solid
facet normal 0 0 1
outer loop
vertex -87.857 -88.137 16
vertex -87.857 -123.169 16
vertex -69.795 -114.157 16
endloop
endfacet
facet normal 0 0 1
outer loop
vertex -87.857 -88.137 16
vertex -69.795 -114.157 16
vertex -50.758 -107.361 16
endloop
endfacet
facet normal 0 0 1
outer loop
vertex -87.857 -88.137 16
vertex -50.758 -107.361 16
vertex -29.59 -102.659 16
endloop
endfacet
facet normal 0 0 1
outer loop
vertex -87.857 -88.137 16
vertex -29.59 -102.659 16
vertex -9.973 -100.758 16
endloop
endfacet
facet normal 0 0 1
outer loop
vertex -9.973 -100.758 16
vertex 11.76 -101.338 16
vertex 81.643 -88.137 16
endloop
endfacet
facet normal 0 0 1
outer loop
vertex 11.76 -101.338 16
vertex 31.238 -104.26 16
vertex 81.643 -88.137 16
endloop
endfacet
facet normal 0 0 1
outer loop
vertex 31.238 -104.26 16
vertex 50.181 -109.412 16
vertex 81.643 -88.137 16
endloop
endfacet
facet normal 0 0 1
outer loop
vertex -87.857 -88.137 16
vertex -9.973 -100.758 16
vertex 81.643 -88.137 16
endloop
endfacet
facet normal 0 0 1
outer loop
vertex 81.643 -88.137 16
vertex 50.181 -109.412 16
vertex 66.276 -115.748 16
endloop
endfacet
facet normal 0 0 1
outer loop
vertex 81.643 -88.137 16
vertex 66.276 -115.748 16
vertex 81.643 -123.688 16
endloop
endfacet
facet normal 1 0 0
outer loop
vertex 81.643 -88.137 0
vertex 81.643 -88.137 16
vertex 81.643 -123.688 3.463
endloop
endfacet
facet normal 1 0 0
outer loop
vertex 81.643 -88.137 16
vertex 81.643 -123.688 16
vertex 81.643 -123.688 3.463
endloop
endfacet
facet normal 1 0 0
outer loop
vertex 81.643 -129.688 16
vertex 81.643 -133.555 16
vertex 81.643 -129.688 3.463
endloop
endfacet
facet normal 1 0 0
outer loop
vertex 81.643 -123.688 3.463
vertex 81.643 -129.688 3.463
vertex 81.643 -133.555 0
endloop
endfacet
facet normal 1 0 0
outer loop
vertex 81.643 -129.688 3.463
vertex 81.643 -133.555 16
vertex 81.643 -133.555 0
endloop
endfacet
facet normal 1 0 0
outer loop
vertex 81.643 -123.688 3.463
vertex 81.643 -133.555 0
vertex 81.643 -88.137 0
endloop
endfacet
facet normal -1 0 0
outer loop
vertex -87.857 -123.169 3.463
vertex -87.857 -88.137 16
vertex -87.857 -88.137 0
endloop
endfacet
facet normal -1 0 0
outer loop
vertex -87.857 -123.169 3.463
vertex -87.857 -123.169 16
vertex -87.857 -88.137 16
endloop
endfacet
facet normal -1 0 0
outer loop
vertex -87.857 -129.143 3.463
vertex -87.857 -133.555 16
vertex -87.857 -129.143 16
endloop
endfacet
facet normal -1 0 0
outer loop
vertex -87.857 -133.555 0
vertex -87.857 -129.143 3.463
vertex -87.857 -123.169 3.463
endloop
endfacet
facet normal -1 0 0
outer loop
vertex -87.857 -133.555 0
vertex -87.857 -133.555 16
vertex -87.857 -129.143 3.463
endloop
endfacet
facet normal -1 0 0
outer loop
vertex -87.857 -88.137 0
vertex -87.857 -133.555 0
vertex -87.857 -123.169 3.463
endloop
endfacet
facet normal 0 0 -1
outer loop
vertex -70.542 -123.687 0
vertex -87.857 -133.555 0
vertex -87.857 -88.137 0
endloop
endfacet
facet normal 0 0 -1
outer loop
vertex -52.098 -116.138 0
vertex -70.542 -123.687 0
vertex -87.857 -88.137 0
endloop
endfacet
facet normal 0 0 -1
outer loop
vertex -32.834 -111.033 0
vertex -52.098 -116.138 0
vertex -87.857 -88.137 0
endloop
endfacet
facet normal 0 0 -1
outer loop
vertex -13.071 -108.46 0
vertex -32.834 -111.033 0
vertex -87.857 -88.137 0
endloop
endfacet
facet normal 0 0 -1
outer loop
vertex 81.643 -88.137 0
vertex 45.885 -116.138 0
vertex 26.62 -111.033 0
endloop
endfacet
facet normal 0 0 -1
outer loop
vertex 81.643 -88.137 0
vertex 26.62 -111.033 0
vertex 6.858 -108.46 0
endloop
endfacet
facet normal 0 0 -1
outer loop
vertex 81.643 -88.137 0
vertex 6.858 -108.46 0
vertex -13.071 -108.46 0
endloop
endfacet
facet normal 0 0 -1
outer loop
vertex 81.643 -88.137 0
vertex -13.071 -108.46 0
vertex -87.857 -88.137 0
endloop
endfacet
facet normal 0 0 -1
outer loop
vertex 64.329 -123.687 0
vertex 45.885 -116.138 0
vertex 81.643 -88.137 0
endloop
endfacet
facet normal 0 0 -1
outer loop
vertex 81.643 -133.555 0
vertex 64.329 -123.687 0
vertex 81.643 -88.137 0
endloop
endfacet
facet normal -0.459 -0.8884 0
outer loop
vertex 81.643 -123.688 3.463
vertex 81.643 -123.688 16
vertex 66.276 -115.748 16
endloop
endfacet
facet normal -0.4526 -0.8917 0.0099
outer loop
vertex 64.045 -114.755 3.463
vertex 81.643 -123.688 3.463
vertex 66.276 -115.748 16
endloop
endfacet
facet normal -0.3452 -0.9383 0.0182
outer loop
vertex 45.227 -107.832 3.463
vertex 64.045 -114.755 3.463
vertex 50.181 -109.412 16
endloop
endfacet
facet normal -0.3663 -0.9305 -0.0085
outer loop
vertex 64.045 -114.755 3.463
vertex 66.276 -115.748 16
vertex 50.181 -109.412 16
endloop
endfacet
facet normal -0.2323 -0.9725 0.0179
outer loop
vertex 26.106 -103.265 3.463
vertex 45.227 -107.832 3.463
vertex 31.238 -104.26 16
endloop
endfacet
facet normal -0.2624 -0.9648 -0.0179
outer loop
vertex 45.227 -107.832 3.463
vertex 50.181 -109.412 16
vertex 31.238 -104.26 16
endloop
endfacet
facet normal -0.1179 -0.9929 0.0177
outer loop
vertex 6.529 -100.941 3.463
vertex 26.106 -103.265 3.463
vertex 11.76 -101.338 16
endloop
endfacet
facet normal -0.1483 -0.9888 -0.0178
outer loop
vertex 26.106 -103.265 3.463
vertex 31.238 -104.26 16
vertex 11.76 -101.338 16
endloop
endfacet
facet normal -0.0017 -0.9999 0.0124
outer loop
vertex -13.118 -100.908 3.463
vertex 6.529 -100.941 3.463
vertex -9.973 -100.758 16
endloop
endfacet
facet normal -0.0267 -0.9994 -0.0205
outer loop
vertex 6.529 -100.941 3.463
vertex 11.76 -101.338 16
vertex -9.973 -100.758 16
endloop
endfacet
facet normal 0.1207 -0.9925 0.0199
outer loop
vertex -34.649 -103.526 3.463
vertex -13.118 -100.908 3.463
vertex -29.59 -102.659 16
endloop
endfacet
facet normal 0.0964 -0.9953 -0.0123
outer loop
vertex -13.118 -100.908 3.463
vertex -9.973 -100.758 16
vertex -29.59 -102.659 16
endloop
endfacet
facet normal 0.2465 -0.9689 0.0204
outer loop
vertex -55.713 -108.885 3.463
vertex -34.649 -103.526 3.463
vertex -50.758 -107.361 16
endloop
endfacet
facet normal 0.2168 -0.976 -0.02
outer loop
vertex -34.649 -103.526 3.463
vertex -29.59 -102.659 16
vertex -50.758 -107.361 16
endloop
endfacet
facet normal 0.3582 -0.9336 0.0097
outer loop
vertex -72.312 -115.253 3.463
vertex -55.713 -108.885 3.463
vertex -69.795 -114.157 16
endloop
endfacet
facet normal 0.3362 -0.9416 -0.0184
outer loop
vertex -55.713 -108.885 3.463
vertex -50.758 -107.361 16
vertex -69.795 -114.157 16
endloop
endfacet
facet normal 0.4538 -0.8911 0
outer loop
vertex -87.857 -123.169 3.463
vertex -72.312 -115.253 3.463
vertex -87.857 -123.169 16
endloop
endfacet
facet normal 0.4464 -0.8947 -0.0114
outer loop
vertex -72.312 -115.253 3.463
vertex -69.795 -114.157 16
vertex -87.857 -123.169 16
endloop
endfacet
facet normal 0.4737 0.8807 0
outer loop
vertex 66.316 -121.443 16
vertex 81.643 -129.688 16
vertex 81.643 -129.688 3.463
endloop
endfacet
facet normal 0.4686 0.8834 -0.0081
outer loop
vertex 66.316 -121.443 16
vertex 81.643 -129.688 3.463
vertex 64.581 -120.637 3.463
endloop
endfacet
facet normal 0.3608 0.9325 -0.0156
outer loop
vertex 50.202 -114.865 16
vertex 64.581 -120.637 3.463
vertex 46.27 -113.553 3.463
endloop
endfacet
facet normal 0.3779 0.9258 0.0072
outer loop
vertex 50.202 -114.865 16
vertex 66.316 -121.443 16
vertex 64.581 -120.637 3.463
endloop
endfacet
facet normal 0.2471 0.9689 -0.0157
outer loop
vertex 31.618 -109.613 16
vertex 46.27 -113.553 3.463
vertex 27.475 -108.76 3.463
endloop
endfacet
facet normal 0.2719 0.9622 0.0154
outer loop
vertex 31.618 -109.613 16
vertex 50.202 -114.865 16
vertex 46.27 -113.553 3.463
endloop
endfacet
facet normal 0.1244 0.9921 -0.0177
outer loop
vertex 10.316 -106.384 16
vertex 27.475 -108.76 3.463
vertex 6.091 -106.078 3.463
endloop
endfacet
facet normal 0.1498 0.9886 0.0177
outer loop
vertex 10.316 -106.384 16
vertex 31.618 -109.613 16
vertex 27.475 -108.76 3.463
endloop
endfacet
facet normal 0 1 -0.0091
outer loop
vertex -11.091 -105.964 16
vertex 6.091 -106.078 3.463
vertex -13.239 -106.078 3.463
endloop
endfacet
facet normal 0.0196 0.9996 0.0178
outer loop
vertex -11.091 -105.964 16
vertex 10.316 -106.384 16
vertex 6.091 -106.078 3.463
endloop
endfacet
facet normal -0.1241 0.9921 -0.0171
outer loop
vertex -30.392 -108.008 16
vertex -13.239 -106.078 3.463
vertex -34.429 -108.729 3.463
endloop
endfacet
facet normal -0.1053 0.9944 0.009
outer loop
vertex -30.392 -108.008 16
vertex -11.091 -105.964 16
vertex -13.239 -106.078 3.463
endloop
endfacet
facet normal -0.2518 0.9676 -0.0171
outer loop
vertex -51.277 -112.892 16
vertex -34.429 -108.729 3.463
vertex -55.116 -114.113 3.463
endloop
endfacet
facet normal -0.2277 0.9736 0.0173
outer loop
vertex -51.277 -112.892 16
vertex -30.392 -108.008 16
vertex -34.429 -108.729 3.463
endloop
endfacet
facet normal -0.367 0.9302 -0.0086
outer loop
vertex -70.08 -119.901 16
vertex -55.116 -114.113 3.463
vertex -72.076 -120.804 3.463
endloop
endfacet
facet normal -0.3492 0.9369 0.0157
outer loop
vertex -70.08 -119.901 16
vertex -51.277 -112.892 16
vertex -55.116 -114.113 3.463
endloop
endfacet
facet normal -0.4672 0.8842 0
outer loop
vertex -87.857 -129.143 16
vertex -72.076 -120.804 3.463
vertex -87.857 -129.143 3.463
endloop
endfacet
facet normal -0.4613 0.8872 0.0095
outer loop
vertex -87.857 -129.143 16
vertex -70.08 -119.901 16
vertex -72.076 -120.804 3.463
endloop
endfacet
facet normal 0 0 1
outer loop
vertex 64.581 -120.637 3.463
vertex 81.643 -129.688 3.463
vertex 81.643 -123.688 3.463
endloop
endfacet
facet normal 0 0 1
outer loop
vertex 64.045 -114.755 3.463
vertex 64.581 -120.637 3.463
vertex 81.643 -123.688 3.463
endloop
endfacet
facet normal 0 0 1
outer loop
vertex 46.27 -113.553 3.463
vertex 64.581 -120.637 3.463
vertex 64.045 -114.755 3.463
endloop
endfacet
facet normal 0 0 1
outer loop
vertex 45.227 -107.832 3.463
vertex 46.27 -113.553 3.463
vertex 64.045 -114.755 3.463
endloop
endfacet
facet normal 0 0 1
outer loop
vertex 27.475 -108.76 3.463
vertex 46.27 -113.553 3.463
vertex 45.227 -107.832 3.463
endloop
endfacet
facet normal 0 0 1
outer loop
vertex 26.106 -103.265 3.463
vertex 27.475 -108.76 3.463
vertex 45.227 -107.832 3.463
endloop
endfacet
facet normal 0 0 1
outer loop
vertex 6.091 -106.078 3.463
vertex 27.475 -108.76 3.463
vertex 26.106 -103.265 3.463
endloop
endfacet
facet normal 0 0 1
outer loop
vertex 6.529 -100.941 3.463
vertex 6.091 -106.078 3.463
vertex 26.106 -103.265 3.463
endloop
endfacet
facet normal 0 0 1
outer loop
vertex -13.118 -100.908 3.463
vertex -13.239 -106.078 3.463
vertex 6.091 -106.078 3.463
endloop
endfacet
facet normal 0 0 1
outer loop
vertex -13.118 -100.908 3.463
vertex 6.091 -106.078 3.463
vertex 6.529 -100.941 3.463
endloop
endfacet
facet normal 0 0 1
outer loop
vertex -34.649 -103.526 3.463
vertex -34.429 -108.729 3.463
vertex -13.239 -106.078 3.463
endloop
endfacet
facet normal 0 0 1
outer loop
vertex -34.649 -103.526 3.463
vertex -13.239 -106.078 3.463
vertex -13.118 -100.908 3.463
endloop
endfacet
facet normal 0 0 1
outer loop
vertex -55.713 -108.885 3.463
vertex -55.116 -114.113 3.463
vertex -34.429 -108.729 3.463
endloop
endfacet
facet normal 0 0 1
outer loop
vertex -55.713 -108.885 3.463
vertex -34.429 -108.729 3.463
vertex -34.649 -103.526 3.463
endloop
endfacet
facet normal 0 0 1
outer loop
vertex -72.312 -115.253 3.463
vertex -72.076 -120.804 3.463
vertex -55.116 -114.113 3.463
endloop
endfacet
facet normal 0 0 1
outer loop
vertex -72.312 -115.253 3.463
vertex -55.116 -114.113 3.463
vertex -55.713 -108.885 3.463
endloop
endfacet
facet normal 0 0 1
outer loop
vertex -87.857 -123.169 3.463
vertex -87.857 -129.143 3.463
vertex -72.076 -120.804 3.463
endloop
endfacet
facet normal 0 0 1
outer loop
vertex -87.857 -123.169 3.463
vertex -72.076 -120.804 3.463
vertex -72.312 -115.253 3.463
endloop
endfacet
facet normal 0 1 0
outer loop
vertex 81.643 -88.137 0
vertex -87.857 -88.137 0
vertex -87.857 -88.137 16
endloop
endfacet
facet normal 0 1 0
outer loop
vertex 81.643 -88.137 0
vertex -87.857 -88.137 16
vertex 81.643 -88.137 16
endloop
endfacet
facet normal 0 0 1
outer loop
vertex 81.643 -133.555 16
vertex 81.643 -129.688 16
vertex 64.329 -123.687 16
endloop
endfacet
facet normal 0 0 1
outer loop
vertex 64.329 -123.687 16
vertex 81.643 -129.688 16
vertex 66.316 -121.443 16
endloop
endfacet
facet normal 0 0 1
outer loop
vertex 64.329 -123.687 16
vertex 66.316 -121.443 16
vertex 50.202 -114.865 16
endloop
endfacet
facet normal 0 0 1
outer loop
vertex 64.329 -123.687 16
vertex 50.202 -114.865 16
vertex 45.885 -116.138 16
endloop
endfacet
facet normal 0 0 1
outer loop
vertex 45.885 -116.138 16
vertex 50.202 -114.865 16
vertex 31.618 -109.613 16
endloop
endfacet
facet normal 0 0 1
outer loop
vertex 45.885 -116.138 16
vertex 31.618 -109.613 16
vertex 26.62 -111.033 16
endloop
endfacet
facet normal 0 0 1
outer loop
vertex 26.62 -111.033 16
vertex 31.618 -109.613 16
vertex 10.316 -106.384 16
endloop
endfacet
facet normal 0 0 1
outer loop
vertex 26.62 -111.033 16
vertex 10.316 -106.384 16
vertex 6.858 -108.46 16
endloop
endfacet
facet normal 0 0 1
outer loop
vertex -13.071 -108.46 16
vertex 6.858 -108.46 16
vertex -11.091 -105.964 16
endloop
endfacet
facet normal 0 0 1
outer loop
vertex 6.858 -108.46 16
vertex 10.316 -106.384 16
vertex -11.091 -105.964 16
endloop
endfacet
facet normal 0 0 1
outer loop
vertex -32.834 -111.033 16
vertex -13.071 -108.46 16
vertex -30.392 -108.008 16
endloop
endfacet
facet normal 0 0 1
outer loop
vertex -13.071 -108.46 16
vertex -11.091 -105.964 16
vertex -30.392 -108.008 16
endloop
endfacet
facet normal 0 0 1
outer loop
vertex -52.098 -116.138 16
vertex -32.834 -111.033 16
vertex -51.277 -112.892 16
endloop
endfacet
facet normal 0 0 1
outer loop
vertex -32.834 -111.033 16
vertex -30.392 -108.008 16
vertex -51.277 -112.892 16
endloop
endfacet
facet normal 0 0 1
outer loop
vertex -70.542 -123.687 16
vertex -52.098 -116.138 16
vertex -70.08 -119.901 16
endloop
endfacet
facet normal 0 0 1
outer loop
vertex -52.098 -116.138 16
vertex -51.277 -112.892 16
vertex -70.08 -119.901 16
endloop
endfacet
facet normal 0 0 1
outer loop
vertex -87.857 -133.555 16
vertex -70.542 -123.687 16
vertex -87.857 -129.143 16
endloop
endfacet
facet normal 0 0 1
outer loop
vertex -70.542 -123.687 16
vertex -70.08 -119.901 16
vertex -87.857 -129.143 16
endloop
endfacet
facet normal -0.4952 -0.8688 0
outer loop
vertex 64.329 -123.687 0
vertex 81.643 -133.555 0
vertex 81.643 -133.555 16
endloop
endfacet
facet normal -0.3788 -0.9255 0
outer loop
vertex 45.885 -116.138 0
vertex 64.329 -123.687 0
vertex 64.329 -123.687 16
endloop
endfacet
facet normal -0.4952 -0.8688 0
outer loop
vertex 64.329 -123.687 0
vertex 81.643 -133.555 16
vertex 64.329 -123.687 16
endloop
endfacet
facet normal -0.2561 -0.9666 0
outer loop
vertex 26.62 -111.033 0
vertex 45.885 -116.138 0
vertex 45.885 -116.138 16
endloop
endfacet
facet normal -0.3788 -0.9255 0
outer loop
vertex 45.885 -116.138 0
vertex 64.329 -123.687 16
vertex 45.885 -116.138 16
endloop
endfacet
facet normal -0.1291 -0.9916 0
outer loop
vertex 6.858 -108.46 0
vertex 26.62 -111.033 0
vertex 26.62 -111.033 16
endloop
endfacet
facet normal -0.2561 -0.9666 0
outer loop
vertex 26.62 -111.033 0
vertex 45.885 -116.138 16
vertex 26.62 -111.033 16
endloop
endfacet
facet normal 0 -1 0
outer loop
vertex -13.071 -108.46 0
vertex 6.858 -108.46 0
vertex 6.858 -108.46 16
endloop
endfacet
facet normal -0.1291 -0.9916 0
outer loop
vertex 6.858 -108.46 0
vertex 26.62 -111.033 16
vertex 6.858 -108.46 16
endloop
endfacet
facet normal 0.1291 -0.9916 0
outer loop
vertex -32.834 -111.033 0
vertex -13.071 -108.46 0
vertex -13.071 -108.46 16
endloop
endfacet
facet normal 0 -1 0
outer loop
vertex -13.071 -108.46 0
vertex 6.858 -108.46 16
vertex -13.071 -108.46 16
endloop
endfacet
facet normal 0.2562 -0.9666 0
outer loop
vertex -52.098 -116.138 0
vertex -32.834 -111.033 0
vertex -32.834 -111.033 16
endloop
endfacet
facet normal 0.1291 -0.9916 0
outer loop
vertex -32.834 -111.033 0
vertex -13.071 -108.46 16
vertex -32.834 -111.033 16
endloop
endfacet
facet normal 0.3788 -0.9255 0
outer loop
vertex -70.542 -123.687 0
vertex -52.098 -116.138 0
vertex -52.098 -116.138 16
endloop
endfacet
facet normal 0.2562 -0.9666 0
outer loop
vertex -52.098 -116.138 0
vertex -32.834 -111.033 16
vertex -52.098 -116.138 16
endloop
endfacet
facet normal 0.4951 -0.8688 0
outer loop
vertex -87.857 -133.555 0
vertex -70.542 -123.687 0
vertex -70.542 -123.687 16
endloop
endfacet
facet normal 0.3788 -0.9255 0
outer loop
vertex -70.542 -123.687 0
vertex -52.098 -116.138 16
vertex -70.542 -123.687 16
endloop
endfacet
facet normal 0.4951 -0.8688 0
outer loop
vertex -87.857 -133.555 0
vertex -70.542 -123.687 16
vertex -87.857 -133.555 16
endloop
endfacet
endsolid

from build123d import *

# Parameters (mm, degrees)
SKETCH1_W           = 169.5
SKETCH1_H           = 47.45
BOSS_EXTRUDE1_DEPTH = 32
SKETCH7_R           = 154
CUT_EXTRUDE5_DEPTH  = 32
SKETCH14_W          = 169.5
SKETCH14_H          = 16
BOSS_EXTRUDE2_DEPTH = 10


with BuildPart() as part:
    # Sketch1 → Boss-Extrude1 (new body)
    with BuildSketch(Plane.XY):
        with Locations((-3.10671108, -121.862113139)):
            Rectangle(SKETCH1_W, SKETCH1_H)
    extrude(amount=BOSS_EXTRUDE1_DEPTH)

    # Sketch7 → Cut-Extrude5 (cut)
    with BuildSketch(Plane.XY.offset(32)):
        with Locations((-3.10671108, -262.137113139)):
            Circle(SKETCH7_R)
    extrude(amount=-CUT_EXTRUDE5_DEPTH, mode=Mode.SUBTRACT)

    # Split2
    split(bisect_by=Plane(origin=(0, 0, 16), x_dir=(-1, 0, 0), z_dir=(0, 0, -1)), keep=Keep.TOP)

    # Cut-Sweep4: read off the stored shape, not the designer's step
    # Cut-Sweep4: loft between two sections, ruled curve by curve
    cut_sweep4_from = [
        Edge.make_bspline([(82.739791111, -124.333714197, 3.462903079), (82.375516408, -124.117363235, 3.462903079), (82.0018328, -123.896841508, 3.462903079), (68.621301032, -116.090106709, 3.462903079), (54.256669748, -110.065617594, 3.462903079), (24.029677947, -102.175579118, 3.462903079), (8.210854863, -100.312946687, 3.462903079), (-23.222204489, -101.051424681, 3.462903079), (-38.798228939, -103.637289837, 3.462903079), (-60.809960607, -110.444286671, 3.462903079), (-67.919122803, -113.18910099, 3.462903079), (-81.548905499, -119.521573676, 3.462903079), (-88.057522246, -123.118344791, 3.46290308), (-94.217927223, -127.000728785, 3.462903079)], [0, 0, 0, 0, 0.006836374, 0.006836374, 0.255127281, 0.255127281, 0.503418187, 0.503418187, 0.751709094, 0.751709094, 0.875854547, 0.875854547, 1, 1, 1, 1], 3),
        Edge.make_bspline([(82.696209972, -130.333555919, 3.462903079), (82.346471994, -130.117236359, 3.462903079), (81.986625524, -129.896841507, 3.462903079), (69.173615468, -122.090106764, 3.46290308), (55.332198525, -115.995213643, 3.462903079), (26.189346767, -107.801652521, 3.462903079), (10.873507842, -105.719561423, 3.462903079), (-19.594281231, -105.863843686, 3.462903079), (-34.749935159, -108.099853973, 3.462903079), (-56.203233344, -114.298356521, 3.462903079), (-63.148715446, -116.838422053, 3.462903079), (-76.467195094, -122.723221567, 3.462903079), (-82.839914651, -126.093721608, 3.462903079), (-88.893908679, -129.767464505, 3.462903079)], [0, 0, 0, 0, 0.006836374, 0.006836374, 0.255127281, 0.255127281, 0.503418187, 0.503418187, 0.751709094, 0.751709094, 0.875854547, 0.875854547, 1, 1, 1, 1], 3),
        Edge.make_line((-88.893908679, -129.767464505, 3.462903079), (-94.217927223, -127.000728785, 3.462903079)),
        Edge.make_line((82.696209972, -130.333555919, 3.462903079), (82.739791111, -124.333714197, 3.462903079)),
    ]
    cut_sweep4_to = [
        Edge.make_bspline([(82.739791111, -124.333714197, 16.002903079), (82.375516408, -124.117363235, 16.002903079), (82.0018328, -123.896841508, 16.002903079), (68.621301031, -116.090106708, 16.002903079), (54.256669748, -110.065617594, 16.002903079), (24.029677947, -102.175579118, 16.002903079), (8.210854863, -100.312946687, 16.002903079), (-23.222204489, -101.051424681, 16.002903079), (-38.798228939, -103.637289837, 16.00290308), (-60.809960607, -110.444286671, 16.002903079), (-67.919122803, -113.18910099, 16.002903079), (-81.548905499, -119.521573676, 16.002903079), (-88.057522246, -123.118344791, 16.002903079), (-94.217927223, -127.000728785, 16.002903079)], [0, 0, 0, 0, 0.006836374, 0.006836374, 0.255127281, 0.255127281, 0.503418187, 0.503418187, 0.751709094, 0.751709094, 0.875854547, 0.875854547, 1, 1, 1, 1], 3),
        Edge.make_bspline([(82.696209972, -130.333555919, 16.002903079), (82.346471994, -130.117236359, 16.002903079), (81.986625524, -129.896841507, 16.002903079), (69.173615467, -122.090106763, 16.00290308), (55.332198525, -115.995213643, 16.002903079), (26.189346767, -107.801652521, 16.002903079), (10.873507842, -105.719561423, 16.002903079), (-19.594281231, -105.863843686, 16.002903079), (-34.749935159, -108.099853973, 16.00290308), (-56.203233344, -114.298356521, 16.002903079), (-63.148715446, -116.838422053, 16.002903079), (-76.467195094, -122.723221567, 16.002903079), (-82.839914651, -126.093721608, 16.002903079), (-88.893908679, -129.767464505, 16.002903079)], [0, 0, 0, 0, 0.006836374, 0.006836374, 0.255127281, 0.255127281, 0.503418187, 0.503418187, 0.751709094, 0.751709094, 0.875854547, 0.875854547, 1, 1, 1, 1], 3),
        Edge.make_line((-88.893908679, -129.767464505, 16.002903079), (-94.217927223, -127.000728785, 16.002903079)),
        Edge.make_line((82.696209972, -130.333555919, 16.002903079), (82.739791111, -124.333714197, 16.002903079)),
    ]
    cut_sweep4 = Solid(Shell([*[Face.make_surface_from_curves(cut_sweep4_from[k], cut_sweep4_to[k]) for k in range(4)], Face(Wire(cut_sweep4_from)), Face(Wire(cut_sweep4_to))]))
    add(cut_sweep4, mode=Mode.SUBTRACT)

    # Sketch14 → Boss-Extrude2 (add)
    with BuildSketch(Plane(origin=(0, -98.137113139, 0), x_dir=(1, 0, 0), z_dir=(0, 1, 0))):
        with Locations((-3.10671108, -8)):
            Rectangle(SKETCH14_W, SKETCH14_H)
    extrude(amount=BOSS_EXTRUDE2_DEPTH)


solid = part.part
